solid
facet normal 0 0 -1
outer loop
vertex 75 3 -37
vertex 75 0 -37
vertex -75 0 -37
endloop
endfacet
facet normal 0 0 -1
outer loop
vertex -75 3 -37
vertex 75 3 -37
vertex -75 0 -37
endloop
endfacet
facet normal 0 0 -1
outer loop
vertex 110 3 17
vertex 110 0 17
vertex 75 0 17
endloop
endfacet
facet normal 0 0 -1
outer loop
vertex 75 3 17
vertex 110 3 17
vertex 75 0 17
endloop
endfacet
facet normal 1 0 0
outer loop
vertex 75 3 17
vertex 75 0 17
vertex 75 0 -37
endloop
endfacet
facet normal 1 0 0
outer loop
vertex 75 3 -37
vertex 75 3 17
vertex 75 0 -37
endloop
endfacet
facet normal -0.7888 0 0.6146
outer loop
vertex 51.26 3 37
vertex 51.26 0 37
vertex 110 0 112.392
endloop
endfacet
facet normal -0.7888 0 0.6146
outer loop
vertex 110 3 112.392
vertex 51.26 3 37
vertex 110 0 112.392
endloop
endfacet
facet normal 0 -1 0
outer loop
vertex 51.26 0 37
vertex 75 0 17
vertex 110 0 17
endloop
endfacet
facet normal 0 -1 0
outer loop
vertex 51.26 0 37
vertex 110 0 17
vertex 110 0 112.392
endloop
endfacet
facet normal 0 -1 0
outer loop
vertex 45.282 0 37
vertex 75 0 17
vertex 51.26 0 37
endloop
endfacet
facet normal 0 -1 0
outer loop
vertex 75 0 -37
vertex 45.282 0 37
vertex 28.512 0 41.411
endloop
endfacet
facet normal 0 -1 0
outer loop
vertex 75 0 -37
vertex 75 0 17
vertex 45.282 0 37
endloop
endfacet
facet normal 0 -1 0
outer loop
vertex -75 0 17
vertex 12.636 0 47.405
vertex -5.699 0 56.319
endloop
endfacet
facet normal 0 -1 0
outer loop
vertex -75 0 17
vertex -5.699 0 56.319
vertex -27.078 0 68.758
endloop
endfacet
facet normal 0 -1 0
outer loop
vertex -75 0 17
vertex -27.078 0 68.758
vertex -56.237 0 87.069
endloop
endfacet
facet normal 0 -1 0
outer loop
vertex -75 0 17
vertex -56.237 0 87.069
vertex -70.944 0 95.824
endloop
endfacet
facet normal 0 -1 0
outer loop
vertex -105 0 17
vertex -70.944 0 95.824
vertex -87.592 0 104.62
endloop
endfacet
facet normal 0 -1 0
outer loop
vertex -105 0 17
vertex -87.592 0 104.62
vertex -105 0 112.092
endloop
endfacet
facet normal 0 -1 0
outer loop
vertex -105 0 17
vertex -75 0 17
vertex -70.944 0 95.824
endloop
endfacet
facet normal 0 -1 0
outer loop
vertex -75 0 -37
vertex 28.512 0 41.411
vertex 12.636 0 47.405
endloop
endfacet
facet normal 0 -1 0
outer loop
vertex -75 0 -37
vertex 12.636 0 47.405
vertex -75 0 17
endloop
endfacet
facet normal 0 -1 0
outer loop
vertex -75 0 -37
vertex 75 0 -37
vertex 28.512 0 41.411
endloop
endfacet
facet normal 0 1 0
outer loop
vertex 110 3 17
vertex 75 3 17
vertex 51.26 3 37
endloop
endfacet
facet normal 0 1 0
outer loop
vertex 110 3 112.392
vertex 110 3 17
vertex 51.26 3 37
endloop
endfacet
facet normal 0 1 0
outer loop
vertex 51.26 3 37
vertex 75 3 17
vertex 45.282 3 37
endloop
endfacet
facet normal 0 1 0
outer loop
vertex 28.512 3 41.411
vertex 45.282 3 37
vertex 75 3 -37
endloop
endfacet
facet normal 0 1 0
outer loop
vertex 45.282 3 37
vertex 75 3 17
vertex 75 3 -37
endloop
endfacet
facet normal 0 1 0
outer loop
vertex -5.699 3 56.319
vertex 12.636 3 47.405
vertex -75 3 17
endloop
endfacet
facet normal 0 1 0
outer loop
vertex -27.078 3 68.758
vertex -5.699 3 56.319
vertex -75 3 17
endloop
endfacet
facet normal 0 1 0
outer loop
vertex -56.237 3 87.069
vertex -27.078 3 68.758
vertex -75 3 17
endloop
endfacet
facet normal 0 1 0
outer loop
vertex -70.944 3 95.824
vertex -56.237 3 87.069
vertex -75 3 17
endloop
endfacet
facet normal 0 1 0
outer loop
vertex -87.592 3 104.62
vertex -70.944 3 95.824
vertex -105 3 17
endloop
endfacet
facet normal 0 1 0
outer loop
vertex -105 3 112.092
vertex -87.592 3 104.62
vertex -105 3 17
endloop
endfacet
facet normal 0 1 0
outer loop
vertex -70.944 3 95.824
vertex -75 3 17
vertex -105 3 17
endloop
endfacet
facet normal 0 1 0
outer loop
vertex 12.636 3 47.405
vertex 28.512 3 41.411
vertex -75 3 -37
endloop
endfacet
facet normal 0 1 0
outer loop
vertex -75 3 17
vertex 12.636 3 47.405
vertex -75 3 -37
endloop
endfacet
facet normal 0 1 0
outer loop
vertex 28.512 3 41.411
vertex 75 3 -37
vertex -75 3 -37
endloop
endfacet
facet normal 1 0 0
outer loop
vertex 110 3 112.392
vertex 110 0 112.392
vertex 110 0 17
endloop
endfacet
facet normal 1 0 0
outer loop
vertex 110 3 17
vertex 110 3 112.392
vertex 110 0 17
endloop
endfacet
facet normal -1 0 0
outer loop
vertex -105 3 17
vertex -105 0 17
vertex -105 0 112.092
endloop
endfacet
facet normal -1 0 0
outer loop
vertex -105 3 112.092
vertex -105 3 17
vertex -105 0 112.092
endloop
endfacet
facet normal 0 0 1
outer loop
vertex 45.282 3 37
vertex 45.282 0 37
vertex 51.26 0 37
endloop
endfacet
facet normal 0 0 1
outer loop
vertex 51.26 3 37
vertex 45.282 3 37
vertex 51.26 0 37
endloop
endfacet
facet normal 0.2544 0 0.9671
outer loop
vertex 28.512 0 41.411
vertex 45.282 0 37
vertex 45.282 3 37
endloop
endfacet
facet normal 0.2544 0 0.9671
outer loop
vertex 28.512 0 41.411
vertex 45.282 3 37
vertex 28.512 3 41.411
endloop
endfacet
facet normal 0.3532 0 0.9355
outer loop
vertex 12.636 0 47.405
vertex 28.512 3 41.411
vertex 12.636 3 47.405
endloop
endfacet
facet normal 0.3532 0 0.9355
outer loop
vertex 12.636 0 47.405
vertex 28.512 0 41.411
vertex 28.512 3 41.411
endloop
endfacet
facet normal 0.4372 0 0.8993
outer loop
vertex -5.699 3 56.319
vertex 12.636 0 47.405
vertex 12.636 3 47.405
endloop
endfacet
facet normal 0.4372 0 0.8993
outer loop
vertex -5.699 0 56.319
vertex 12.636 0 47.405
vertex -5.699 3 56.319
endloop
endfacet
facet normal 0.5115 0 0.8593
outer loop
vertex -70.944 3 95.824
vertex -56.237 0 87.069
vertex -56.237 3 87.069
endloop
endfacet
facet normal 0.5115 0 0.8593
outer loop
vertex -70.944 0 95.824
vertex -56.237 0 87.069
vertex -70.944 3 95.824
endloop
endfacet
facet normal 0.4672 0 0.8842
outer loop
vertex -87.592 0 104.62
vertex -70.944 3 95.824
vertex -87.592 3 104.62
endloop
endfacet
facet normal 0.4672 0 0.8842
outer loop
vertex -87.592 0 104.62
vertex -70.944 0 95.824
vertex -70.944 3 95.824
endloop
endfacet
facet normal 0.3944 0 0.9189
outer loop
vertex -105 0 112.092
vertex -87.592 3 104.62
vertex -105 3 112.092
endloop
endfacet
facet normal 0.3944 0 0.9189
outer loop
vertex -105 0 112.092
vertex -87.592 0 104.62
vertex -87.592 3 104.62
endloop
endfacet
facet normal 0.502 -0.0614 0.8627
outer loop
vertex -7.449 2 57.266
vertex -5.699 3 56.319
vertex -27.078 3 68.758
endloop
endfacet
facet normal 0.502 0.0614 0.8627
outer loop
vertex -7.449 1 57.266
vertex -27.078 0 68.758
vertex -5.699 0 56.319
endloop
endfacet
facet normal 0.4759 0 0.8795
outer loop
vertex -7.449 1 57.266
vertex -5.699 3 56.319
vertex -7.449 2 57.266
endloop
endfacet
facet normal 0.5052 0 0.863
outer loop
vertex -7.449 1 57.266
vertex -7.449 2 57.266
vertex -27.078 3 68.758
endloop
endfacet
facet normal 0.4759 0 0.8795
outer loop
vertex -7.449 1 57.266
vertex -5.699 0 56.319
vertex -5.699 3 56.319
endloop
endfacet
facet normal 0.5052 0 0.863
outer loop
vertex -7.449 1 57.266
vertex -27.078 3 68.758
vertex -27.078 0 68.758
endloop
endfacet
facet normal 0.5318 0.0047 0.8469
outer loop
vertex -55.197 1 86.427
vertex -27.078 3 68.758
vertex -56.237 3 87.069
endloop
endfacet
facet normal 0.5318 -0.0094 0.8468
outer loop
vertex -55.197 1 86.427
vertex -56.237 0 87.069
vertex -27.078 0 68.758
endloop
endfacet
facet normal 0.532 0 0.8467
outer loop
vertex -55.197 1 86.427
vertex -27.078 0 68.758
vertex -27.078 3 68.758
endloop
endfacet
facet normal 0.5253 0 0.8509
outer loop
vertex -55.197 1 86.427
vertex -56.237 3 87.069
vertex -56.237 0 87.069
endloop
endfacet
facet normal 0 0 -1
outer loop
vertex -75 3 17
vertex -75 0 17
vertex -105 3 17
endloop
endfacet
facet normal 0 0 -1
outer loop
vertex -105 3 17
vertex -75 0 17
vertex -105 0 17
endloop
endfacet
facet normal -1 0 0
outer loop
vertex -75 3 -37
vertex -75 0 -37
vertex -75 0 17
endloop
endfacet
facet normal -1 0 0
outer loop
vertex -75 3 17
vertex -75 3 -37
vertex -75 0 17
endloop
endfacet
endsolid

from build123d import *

# Parameters (mm, degrees)
BOSS_EXTRUDE1_DEPTH = 3


with BuildPart() as part:
    # Sketch1 → Boss-Extrude1 (new body)
    with BuildSketch(Plane(origin=(0, 0, 0), x_dir=(1, 0, 0), z_dir=(0, 1, 0))):
        with BuildLine():
            add(Edge.make_bspline(
                [(45.281536872, -37), (-12.284726177, -48.689174516), (-51.82483075, -92.30412262), (-105, -112.092029096)],
                knots=[0, 0, 0, 0, 1, 1, 1, 1], degree=3))
            Line((45.281536872, -37), (51.259707723, -37))
            Line((51.259707723, -37), (110, -112.392253356))
            Line((110, -112.392253356), (110, -17))
            Line((110, -17), (75, -17))
            Line((75, -17), (75, 37))
            Line((75, 37), (-75, 37))
            Line((-75, 37), (-75, -17))
            Line((-75, -17), (-105, -17))
            Line((-105, -17), (-105, -112.092029096))
        make_face()
    extrude(amount=BOSS_EXTRUDE1_DEPTH)


solid = part.part
